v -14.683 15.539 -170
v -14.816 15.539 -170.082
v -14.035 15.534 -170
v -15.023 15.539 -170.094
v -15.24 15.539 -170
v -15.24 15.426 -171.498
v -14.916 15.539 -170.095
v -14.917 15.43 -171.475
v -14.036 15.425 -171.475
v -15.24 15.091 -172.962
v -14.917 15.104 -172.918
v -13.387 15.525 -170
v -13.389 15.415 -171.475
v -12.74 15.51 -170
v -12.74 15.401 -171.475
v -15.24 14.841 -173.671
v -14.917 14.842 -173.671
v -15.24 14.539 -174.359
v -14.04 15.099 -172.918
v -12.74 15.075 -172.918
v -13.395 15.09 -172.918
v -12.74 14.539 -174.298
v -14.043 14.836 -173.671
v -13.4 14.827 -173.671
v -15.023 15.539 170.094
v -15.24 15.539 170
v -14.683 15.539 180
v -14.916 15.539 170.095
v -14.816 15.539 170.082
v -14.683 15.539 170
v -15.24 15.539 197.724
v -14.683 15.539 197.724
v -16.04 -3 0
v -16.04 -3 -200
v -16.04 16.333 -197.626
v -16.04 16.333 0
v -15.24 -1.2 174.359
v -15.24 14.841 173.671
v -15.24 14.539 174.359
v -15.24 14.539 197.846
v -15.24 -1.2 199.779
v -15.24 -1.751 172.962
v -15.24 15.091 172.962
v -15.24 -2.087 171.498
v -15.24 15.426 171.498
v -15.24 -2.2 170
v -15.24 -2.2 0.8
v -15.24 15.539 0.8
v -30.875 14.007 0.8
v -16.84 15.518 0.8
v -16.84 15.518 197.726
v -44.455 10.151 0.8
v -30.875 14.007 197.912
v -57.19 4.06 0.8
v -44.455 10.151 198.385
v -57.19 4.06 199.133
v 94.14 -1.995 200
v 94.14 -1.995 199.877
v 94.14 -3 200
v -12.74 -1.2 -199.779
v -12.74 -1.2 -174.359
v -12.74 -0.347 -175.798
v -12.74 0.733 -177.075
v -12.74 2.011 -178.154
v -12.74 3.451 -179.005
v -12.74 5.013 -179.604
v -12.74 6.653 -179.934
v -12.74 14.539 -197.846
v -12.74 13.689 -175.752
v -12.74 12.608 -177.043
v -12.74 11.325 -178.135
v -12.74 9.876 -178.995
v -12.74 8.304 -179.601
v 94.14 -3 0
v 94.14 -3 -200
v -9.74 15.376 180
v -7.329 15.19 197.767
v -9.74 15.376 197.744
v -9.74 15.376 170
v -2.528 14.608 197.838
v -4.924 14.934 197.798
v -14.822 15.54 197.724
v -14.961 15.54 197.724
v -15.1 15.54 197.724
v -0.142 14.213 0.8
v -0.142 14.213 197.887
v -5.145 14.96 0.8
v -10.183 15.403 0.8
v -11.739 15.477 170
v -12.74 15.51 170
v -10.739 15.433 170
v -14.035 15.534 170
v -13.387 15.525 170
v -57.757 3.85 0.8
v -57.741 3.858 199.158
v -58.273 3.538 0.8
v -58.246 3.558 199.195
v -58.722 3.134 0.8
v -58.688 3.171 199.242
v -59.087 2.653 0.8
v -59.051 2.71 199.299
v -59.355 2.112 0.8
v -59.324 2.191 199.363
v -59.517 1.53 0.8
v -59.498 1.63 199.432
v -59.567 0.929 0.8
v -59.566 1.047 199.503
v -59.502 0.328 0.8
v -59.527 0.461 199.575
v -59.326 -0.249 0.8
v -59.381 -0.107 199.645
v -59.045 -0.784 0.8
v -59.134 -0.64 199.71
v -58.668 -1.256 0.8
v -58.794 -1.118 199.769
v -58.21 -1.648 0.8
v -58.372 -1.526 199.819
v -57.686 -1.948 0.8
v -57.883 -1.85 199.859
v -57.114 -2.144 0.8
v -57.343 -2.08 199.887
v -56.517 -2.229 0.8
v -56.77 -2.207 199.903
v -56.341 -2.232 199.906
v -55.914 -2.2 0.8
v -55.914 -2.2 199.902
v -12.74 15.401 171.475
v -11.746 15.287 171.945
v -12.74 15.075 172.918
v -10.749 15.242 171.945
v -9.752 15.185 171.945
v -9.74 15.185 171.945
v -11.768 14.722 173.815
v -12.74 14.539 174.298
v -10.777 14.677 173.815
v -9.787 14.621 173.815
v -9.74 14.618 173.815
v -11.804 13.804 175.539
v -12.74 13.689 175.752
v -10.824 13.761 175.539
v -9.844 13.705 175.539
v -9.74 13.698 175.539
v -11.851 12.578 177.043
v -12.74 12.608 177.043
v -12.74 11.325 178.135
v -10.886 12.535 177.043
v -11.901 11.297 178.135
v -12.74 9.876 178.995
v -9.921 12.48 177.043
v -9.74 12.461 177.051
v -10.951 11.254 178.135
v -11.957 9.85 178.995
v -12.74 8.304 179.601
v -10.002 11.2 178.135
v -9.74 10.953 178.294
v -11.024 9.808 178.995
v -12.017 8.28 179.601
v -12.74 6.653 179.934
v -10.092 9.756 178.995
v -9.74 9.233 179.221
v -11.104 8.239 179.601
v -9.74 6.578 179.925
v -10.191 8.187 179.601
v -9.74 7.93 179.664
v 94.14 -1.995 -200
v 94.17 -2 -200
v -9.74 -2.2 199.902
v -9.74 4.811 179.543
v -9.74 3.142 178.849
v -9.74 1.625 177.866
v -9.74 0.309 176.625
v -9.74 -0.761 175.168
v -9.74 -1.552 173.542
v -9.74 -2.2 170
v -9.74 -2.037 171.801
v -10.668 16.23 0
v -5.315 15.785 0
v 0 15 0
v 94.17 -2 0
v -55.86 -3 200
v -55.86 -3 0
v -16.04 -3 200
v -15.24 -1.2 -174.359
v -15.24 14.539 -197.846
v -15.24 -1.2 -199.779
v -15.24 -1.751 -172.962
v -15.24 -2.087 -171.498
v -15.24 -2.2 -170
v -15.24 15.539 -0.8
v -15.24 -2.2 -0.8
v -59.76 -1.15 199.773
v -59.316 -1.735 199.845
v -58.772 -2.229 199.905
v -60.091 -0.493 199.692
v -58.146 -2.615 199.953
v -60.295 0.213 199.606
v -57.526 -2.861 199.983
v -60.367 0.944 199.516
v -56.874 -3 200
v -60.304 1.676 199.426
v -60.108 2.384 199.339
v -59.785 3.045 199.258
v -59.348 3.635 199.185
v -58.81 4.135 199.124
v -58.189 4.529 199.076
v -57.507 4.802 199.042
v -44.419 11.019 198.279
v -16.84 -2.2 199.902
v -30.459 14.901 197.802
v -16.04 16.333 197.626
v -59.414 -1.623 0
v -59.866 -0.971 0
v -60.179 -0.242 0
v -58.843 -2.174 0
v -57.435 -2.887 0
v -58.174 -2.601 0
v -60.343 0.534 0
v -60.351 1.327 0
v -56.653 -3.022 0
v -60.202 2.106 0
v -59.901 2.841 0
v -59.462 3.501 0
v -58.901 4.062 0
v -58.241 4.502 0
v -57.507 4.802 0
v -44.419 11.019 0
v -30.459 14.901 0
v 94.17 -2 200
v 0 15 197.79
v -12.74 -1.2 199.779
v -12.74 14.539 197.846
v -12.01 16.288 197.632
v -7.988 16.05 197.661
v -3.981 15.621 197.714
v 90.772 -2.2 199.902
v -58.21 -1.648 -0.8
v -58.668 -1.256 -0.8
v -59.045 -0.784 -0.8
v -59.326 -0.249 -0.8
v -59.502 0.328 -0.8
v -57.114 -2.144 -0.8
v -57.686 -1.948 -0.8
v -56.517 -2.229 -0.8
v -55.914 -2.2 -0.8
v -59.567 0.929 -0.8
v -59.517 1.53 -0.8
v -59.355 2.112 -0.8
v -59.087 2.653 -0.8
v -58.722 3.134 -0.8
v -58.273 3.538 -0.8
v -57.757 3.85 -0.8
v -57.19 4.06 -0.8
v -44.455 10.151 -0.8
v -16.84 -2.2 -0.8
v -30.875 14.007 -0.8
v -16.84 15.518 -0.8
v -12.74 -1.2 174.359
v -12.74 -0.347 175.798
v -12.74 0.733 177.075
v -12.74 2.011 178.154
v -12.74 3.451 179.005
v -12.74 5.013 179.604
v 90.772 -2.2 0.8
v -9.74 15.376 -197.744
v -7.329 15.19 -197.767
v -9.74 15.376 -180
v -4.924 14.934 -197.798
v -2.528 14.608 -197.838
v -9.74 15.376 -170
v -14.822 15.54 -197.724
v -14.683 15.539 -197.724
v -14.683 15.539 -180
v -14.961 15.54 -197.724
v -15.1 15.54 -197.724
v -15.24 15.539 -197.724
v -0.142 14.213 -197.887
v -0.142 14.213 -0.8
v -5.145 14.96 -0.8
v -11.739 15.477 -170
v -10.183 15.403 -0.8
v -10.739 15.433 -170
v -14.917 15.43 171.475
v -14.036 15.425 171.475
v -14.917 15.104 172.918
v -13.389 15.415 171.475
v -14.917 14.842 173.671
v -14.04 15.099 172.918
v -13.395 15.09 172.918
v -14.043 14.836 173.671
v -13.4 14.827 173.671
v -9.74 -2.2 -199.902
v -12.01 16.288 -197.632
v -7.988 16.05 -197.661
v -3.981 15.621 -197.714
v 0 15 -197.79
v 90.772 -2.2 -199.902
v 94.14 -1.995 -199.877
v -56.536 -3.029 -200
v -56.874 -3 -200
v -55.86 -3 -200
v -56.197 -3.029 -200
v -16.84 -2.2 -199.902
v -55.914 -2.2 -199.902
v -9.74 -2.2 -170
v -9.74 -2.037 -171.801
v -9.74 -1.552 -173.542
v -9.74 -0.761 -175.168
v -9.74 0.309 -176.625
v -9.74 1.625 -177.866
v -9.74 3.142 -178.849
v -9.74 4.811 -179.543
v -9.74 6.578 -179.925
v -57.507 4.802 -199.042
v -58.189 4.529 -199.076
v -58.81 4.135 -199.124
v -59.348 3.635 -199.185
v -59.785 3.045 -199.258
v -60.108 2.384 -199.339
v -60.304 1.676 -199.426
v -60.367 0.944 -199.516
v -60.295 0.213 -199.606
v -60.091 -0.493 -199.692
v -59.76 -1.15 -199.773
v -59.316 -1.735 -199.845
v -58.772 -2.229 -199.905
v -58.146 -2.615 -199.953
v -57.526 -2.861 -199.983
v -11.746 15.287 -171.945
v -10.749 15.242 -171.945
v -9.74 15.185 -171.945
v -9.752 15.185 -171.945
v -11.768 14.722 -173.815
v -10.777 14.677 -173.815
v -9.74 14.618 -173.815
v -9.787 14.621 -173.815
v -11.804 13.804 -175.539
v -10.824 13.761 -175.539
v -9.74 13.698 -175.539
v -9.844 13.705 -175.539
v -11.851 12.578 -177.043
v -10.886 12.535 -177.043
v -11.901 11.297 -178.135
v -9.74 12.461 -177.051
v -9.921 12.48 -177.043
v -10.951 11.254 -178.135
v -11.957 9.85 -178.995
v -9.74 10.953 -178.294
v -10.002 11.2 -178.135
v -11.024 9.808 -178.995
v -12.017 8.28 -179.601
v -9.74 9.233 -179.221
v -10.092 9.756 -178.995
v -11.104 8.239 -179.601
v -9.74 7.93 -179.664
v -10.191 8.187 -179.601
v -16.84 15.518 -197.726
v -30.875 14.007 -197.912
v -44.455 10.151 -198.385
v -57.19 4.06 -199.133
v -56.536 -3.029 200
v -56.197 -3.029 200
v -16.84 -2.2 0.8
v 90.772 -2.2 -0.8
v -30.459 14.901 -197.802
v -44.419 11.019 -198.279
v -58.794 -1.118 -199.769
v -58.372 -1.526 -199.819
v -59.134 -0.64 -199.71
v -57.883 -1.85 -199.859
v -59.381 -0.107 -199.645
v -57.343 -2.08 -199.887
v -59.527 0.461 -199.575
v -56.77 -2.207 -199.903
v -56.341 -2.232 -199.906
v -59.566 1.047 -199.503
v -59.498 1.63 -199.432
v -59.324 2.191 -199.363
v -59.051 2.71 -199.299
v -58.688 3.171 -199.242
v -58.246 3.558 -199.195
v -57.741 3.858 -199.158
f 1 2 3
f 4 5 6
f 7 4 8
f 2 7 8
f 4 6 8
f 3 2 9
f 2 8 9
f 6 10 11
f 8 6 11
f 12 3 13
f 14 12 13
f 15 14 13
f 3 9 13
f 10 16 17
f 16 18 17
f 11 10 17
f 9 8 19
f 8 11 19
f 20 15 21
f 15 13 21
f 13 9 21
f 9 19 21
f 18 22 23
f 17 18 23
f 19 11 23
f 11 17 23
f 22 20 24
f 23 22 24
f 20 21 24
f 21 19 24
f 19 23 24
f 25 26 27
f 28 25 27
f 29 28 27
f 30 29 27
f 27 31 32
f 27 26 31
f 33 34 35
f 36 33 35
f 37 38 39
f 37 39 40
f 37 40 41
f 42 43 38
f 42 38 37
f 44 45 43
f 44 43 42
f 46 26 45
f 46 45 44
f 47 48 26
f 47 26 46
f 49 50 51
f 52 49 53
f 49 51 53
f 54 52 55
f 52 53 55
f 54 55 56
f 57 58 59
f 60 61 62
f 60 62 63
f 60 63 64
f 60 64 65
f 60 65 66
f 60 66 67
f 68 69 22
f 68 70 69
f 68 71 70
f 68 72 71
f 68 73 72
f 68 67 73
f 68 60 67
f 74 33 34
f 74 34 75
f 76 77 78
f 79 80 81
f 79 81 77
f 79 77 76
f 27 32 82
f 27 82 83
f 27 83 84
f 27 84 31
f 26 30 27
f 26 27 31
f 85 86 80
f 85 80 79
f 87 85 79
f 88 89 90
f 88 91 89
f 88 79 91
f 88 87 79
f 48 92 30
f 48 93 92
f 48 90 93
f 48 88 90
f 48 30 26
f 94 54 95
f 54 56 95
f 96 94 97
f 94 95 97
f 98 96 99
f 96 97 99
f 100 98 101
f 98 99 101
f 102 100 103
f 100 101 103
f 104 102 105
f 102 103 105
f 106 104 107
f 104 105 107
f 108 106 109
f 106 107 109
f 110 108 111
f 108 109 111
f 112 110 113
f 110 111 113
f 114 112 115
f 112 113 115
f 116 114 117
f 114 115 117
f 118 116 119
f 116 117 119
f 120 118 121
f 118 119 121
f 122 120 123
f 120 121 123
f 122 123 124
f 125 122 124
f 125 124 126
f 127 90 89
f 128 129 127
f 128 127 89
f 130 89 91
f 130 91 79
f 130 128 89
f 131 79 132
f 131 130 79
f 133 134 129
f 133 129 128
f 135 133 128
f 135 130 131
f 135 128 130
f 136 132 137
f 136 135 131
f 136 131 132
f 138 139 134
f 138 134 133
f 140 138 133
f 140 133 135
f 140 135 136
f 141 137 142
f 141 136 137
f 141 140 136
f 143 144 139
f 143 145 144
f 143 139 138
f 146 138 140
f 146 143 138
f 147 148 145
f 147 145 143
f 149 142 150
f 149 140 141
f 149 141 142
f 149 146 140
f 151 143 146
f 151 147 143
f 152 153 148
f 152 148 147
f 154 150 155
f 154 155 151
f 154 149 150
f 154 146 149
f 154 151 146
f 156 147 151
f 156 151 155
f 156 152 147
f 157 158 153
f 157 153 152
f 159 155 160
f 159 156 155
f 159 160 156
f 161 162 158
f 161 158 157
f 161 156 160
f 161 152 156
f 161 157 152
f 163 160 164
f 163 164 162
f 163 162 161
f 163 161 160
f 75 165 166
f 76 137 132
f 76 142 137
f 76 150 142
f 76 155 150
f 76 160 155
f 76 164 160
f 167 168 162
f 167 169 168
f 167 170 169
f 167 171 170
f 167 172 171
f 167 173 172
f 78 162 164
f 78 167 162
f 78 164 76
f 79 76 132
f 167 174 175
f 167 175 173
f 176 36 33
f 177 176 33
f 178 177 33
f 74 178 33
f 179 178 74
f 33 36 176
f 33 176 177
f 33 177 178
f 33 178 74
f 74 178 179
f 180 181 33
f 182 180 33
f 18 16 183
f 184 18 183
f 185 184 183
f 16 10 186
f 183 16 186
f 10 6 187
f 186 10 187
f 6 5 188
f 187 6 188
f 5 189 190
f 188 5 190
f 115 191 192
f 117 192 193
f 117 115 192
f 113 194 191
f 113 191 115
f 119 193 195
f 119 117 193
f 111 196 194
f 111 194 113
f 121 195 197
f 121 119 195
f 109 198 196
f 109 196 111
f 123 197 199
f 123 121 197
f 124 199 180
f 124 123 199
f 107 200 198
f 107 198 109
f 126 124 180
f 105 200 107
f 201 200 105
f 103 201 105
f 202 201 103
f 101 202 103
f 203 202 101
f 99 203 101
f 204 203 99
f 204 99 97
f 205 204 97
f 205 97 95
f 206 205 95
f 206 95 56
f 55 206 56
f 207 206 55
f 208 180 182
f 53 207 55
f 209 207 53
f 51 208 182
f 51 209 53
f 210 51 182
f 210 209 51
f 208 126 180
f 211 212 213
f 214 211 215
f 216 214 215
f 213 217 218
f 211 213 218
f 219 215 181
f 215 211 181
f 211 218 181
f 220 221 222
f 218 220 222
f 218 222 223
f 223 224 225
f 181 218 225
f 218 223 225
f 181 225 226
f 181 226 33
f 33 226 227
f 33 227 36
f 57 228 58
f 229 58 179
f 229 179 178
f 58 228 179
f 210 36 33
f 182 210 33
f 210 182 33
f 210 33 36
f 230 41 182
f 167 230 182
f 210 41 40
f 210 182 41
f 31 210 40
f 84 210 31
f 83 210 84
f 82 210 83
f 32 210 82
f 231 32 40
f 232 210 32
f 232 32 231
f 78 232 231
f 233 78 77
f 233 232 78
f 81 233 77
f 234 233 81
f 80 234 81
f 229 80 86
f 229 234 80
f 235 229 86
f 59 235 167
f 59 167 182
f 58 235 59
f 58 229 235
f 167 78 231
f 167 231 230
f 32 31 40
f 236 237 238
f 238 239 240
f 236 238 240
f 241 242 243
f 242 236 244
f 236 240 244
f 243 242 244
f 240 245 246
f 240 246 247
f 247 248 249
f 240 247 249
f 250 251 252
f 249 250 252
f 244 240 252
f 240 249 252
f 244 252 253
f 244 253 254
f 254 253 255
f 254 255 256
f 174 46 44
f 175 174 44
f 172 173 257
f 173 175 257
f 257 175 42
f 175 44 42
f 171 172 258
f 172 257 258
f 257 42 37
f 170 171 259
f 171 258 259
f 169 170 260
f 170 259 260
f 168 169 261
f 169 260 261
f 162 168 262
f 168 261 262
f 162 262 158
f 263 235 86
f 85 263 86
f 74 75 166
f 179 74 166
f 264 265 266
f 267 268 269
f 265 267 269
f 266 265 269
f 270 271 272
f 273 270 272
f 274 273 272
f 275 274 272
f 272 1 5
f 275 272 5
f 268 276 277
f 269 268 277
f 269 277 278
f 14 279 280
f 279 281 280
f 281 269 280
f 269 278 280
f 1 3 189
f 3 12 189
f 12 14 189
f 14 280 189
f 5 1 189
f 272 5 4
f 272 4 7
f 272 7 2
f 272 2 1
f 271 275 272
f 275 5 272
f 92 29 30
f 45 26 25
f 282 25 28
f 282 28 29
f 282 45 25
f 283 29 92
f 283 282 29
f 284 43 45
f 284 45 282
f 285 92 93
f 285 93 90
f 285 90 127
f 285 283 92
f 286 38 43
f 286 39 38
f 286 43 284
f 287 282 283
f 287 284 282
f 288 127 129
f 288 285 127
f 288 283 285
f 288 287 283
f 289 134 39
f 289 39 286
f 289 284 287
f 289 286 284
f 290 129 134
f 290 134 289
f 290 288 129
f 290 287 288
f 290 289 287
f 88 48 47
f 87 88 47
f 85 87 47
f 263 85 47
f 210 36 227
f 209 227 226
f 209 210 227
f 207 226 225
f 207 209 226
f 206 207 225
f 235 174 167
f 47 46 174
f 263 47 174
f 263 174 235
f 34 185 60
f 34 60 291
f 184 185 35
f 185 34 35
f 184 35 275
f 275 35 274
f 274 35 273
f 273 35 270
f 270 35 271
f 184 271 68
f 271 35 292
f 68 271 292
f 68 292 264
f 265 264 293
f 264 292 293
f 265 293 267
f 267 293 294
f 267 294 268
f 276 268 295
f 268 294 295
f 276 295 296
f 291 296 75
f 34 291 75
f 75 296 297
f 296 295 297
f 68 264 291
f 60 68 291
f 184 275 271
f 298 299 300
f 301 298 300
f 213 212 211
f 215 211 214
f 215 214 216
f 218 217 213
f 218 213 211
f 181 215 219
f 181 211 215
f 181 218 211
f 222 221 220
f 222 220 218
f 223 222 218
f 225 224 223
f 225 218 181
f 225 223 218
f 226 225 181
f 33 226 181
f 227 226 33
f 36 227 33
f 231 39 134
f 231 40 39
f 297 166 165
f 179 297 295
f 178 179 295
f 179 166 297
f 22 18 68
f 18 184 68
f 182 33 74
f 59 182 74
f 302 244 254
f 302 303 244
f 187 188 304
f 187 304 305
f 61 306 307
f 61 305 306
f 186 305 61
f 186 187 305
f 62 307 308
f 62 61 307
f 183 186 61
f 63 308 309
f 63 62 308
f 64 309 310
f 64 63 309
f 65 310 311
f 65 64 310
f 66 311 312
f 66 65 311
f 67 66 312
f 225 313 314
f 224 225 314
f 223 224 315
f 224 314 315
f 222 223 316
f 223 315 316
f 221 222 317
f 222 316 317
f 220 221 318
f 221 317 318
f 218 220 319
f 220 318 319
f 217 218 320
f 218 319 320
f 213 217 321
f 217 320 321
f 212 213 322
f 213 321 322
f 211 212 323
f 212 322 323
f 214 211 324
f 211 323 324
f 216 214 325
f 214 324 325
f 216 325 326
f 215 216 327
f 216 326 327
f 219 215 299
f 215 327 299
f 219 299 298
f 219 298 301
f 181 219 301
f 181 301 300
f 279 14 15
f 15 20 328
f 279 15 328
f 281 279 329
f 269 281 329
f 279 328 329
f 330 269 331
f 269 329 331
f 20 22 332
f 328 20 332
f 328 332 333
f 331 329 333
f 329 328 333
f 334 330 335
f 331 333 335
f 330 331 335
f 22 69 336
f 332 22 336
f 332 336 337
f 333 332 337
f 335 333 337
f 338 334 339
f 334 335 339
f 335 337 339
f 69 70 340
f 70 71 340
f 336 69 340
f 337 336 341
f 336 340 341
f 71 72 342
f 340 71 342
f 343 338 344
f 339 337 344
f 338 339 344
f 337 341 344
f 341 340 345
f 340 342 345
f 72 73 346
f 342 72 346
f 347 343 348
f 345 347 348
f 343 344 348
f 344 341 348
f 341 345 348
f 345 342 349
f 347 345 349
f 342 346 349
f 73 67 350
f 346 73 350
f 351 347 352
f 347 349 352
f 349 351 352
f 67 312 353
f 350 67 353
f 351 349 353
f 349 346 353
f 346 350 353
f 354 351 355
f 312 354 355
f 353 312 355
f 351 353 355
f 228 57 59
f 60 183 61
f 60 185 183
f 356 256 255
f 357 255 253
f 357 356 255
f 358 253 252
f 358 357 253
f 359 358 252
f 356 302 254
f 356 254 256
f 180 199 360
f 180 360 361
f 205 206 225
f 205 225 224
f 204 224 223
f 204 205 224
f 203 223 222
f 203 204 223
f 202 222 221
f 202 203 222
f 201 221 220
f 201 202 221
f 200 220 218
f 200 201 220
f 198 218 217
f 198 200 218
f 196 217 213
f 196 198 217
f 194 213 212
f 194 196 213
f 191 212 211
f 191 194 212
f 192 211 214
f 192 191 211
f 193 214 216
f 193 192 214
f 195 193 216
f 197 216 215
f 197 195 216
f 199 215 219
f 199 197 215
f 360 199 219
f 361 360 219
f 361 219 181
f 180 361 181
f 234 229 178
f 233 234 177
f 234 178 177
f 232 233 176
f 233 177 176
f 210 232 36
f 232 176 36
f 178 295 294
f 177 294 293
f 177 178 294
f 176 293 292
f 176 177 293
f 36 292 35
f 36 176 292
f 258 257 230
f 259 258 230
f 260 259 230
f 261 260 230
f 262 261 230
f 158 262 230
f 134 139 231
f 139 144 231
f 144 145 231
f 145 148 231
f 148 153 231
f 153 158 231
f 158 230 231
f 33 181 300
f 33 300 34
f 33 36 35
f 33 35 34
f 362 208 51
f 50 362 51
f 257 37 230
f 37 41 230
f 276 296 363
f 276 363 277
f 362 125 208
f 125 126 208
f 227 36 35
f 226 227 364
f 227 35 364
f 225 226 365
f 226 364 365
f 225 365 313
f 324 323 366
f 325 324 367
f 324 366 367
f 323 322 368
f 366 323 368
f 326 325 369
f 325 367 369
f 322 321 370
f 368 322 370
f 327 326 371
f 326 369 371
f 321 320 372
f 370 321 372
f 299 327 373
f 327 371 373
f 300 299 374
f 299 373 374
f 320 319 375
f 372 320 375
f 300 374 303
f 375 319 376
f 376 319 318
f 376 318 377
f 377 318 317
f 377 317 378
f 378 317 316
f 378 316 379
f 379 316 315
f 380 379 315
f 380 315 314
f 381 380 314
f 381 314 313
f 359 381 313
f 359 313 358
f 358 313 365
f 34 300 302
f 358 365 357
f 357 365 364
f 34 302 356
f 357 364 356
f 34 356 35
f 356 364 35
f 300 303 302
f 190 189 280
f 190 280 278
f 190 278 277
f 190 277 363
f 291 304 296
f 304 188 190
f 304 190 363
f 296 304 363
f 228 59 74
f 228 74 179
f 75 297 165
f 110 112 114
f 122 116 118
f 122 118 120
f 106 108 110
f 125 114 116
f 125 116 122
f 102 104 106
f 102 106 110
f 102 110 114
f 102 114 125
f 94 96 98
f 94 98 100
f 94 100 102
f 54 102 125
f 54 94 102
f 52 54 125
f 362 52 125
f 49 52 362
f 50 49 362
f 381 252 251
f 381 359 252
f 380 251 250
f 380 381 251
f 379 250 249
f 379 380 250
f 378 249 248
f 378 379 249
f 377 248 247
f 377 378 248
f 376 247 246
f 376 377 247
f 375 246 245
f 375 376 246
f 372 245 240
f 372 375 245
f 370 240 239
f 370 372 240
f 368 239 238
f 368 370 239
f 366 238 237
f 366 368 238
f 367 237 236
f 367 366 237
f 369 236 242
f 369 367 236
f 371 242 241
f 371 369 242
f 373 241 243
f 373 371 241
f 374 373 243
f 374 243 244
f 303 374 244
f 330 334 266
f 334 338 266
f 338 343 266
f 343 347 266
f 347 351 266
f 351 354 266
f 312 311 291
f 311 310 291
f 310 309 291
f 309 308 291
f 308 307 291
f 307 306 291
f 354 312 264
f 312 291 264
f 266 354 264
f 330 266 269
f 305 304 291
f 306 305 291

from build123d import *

# Parameters (mm, degrees)
F1_DEPTH     = 200
F3_DEPTH     = 200
F4_T         = -0.8
F4_2_T       = -0.8
F5_W         = 2.5
F5_H         = 1
F6_DEPTH     = 20
F7_T4_DEPTH  = 5.5
F7_T9_DEPTH  = 30.5
F7_T14_ANGLE = 37.7423343373
F7_T20_ANGLE = 37.7423343373
F8_W         = 155.1876314091
F8_H         = 22.3366669118
F9_ANGLE     = 7


# Not quite as in the source:
# - a fillet or chamfer that OpenCascade refuses, or shapes differently, is made with other operations: its cross-section is extruded or revolved along the edge and cut away or added


with BuildPart() as f1:
    # F0 (on Top) → F1 (new body)
    with BuildSketch(Plane.XY):
        with BuildLine():
            Line((94.1401966023, -3), (94.1696608117, -2.0004341641))
            Line((94.1696608117, -2.0004341641), (0, 15))
            ThreePointArc((0, 15), (-7.9879059152, 16.0504323354), (-16.0396361483, 16.3327251865))
            Line((-16.0396361483, 16.3327251865), (-16.0396361483, -3))
            Line((-16.0396361483, -3), (94.1401966023, -3))
        make_face()
    extrude(amount=F1_DEPTH)

    # F4
    f4_openings = [f1.faces().sort_by_distance(p)[0] for p in [
        (22.614044, 3.891358, 200),
    ]]
    offset(amount=F4_T, openings=f4_openings)

    # F5 (on face) → F6 (join)
    with BuildSketch(Plane.XY.offset(200)):
        Polygon((-12.7396361483, -1.2), (-12.7396361483, -2.2), (-9.7396361483, -2.2), (-9.7396361483, 15.5391672506), (-12.7396361483, 15.5391672506), (-12.7396361483, 14.5391672506), align=None)
        with Locations((-13.9896361483, -1.7)):
            Rectangle(F5_W, F5_H)
        with Locations((-13.9896361483, 15.0391672506)):
            Rectangle(F5_W, F5_H)
    extrude(amount=-F6_DEPTH)

    # F7: fillet of radius 10 on 2 edges, made by hand


with BuildPart() as f3:
    # F2 (on face) → F3 (new body)
    with BuildSketch(Plane.XY.offset(200)):
        with BuildLine():
            Line((-16.0396361483, -3), (-16.0396361483, 16.3327251865))
            ThreePointArc((-16.0396361483, 16.3327251865), (-37.5222437907, 13.2612199418), (-57.5066562048, 4.8019152395))
            ThreePointArc((-57.5066562048, 4.8019152395), (-60.2806962129, 0.1415930949), (-55.8598033977, -3))
            Line((-55.8598033977, -3), (-16.0396361483, -3))
        make_face()
    extrude(amount=-F3_DEPTH)

    # F4#2
    f4_2_openings = [f3.faces().sort_by_distance(p)[0] for p in [
        (-34.83961, 5.023506, 200),
    ]]
    offset(amount=F4_2_T, openings=f4_2_openings, kind=Kind.INTERSECTION)


with BuildPart() as f7_tool2:
    # F7_s3 → F7_t4 (new body)
    with BuildSketch(Plane.YZ.offset(-15.2396361483)):
        with BuildLine():
            ThreePointArc((-2.2, 170), (0.7289321881, 177.0710678119), (7.8, 180))
            Line((7.8, 180), (-2.2, 180))
            Line((-2.2, 180), (-2.2, 170))
        make_face()
    extrude(amount=F7_T4_DEPTH)

    split(bisect_by=Plane.XZ.offset(1.2), keep=Keep.TOP)


with BuildPart() as f1_1:
    add(f1.part)

    # F7_t1: union F7_tool2
    add(f7_tool2.part)


with BuildPart() as f7_tool7:
    # F7_s8 → F7_t9 (new body)
    with BuildSketch(Plane.YZ.offset(-40.2396361483)):
        with BuildLine():
            ThreePointArc((-2.2, 170), (0.7289321881, 177.0710678119), (7.8, 180))
            Line((7.8, 180), (-2.2, 180))
            Line((-2.2, 180), (-2.2, 170))
        make_face()
    extrude(amount=F7_T9_DEPTH)

    split(bisect_by=Plane.YZ.offset(-12.7396361483), keep=Keep.TOP)


with BuildPart() as f1_2:
    add(f1_1.part)

    # F7_t6: union F7_tool7
    add(f7_tool7.part)


with BuildPart() as f7_tool12:
    # F7_s13 → F7_t14 (revolve)
    with BuildSketch(Plane(origin=(-32.6433997569, -9.9682739464, 0), x_dir=(0, 0, 1), z_dir=(-0.9564014883, -0.2920551201, 0))):
        with BuildLine():
            ThreePointArc((170, 22.8682565899), (177.0710678119, 19.9393244018), (180, 12.8682565899))
            Line((180, 12.8682565899), (180, 22.8682565899))
            Line((180, 22.8682565899), (170, 22.8682565899))
        make_face()
    revolve(axis=Axis((-14.9610707823, -67.8731164952, 180), (0, 0, -1)), revolution_arc=F7_T14_ANGLE)

    split(bisect_by=Plane.YZ.offset(-12.7396361483), keep=Keep.TOP)

    split(bisect_by=Plane.YZ.offset(-9.7396361483), keep=Keep.BOTTOM)


with BuildPart() as f1_3:
    add(f1_2.part)

    # F7_t11: union F7_tool12
    add(f7_tool12.part)


with BuildPart() as f7_tool18:
    # F7_s19 → F7_t20 (revolve)
    with BuildSketch(Plane(origin=(-32.6433997569, -9.9682739464, 0), x_dir=(0, 0, 1), z_dir=(-0.9564014883, -0.2920551201, 0))):
        with BuildLine():
            ThreePointArc((170, 22.8682565899), (177.0710678119, 19.9393244018), (180, 12.8682565899))
            Line((180, 12.8682565899), (180, 22.8682565899))
            Line((180, 22.8682565899), (170, 22.8682565899))
        make_face()
    revolve(axis=Axis((-14.9610707823, -67.8731164952, 180), (0, 0, -1)), revolution_arc=F7_T20_ANGLE)

    split(bisect_by=Plane.YZ.offset(-15.2396361483), keep=Keep.TOP)

    split(bisect_by=Plane.XZ.offset(-14.5391672506), keep=Keep.BOTTOM)

    split(bisect_by=Plane.XZ.offset(-15.5391672506), keep=Keep.TOP)

    split(bisect_by=Plane.YZ.offset(-9.7396361483), keep=Keep.BOTTOM)


with BuildPart() as f1_4:
    add(f1_3.part)

    # F7_t17: union F7_tool18
    add(f7_tool18.part)


with BuildPart() as f9_tool:
    # F8 (on face) → F9 (revolve)
    with BuildSketch(Plane.XY.offset(200)):
        with Locations((16.5463808977, 8.1683334559)):
            Rectangle(F8_W, F8_H)
    revolve(axis=Axis((16.5463808977, -3, 200), (-1, 0, 0)), revolution_arc=F9_ANGLE)


with BuildPart() as f1_5:
    add(f1_4.part)

    # F9: cut by f9_tool
    add(f9_tool.part, mode=Mode.SUBTRACT)


with BuildPart() as f3_1:
    add(f3.part)

    # F9: cut by f9_tool
    add(f9_tool.part, mode=Mode.SUBTRACT)


with BuildPart() as f10_1:
    # F10: instance of F1
    add(f1_5.part.mirror(Plane.XY))


with BuildPart() as f10_2:
    # F10: instance of F3
    add(f3_1.part.mirror(Plane.XY))


solid = Compound([f1_5.part, f3_1.part, f10_1.part, f10_2.part])
